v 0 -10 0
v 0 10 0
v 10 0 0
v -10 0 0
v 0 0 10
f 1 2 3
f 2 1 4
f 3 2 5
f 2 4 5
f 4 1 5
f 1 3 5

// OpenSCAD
echo(version=version());

polyhedron(
	points = [
		[10, 0, 0],
		[0, 10, 0],
		[-10, 0, 0],
		[0, -10, 0],
		[0, 0, 10]
	],
	faces = [
		[0, 1, 2, 3],
		[4, 1, 0],
		[4, 2, 1],
		[4, 3, 2],
		[4, 0, 3]
	]
);

// Written by Clifford Wolf &ltclifford@clifford.at> and Marius
// Kintel &ltmarius@kintel.net>
//
// To the extent possible under law, the author(s) have dedicated all
// copyright and related and neighboring rights to this software to the
// public domain worldwide. This software is distributed without any
// warranty.
//
// You should have received a copy of the CC0 Public Domain
// Dedication along with this software.
// If not, see &lthttp://creativecommons.org/publicdomain/zero/1.0/&gt.
